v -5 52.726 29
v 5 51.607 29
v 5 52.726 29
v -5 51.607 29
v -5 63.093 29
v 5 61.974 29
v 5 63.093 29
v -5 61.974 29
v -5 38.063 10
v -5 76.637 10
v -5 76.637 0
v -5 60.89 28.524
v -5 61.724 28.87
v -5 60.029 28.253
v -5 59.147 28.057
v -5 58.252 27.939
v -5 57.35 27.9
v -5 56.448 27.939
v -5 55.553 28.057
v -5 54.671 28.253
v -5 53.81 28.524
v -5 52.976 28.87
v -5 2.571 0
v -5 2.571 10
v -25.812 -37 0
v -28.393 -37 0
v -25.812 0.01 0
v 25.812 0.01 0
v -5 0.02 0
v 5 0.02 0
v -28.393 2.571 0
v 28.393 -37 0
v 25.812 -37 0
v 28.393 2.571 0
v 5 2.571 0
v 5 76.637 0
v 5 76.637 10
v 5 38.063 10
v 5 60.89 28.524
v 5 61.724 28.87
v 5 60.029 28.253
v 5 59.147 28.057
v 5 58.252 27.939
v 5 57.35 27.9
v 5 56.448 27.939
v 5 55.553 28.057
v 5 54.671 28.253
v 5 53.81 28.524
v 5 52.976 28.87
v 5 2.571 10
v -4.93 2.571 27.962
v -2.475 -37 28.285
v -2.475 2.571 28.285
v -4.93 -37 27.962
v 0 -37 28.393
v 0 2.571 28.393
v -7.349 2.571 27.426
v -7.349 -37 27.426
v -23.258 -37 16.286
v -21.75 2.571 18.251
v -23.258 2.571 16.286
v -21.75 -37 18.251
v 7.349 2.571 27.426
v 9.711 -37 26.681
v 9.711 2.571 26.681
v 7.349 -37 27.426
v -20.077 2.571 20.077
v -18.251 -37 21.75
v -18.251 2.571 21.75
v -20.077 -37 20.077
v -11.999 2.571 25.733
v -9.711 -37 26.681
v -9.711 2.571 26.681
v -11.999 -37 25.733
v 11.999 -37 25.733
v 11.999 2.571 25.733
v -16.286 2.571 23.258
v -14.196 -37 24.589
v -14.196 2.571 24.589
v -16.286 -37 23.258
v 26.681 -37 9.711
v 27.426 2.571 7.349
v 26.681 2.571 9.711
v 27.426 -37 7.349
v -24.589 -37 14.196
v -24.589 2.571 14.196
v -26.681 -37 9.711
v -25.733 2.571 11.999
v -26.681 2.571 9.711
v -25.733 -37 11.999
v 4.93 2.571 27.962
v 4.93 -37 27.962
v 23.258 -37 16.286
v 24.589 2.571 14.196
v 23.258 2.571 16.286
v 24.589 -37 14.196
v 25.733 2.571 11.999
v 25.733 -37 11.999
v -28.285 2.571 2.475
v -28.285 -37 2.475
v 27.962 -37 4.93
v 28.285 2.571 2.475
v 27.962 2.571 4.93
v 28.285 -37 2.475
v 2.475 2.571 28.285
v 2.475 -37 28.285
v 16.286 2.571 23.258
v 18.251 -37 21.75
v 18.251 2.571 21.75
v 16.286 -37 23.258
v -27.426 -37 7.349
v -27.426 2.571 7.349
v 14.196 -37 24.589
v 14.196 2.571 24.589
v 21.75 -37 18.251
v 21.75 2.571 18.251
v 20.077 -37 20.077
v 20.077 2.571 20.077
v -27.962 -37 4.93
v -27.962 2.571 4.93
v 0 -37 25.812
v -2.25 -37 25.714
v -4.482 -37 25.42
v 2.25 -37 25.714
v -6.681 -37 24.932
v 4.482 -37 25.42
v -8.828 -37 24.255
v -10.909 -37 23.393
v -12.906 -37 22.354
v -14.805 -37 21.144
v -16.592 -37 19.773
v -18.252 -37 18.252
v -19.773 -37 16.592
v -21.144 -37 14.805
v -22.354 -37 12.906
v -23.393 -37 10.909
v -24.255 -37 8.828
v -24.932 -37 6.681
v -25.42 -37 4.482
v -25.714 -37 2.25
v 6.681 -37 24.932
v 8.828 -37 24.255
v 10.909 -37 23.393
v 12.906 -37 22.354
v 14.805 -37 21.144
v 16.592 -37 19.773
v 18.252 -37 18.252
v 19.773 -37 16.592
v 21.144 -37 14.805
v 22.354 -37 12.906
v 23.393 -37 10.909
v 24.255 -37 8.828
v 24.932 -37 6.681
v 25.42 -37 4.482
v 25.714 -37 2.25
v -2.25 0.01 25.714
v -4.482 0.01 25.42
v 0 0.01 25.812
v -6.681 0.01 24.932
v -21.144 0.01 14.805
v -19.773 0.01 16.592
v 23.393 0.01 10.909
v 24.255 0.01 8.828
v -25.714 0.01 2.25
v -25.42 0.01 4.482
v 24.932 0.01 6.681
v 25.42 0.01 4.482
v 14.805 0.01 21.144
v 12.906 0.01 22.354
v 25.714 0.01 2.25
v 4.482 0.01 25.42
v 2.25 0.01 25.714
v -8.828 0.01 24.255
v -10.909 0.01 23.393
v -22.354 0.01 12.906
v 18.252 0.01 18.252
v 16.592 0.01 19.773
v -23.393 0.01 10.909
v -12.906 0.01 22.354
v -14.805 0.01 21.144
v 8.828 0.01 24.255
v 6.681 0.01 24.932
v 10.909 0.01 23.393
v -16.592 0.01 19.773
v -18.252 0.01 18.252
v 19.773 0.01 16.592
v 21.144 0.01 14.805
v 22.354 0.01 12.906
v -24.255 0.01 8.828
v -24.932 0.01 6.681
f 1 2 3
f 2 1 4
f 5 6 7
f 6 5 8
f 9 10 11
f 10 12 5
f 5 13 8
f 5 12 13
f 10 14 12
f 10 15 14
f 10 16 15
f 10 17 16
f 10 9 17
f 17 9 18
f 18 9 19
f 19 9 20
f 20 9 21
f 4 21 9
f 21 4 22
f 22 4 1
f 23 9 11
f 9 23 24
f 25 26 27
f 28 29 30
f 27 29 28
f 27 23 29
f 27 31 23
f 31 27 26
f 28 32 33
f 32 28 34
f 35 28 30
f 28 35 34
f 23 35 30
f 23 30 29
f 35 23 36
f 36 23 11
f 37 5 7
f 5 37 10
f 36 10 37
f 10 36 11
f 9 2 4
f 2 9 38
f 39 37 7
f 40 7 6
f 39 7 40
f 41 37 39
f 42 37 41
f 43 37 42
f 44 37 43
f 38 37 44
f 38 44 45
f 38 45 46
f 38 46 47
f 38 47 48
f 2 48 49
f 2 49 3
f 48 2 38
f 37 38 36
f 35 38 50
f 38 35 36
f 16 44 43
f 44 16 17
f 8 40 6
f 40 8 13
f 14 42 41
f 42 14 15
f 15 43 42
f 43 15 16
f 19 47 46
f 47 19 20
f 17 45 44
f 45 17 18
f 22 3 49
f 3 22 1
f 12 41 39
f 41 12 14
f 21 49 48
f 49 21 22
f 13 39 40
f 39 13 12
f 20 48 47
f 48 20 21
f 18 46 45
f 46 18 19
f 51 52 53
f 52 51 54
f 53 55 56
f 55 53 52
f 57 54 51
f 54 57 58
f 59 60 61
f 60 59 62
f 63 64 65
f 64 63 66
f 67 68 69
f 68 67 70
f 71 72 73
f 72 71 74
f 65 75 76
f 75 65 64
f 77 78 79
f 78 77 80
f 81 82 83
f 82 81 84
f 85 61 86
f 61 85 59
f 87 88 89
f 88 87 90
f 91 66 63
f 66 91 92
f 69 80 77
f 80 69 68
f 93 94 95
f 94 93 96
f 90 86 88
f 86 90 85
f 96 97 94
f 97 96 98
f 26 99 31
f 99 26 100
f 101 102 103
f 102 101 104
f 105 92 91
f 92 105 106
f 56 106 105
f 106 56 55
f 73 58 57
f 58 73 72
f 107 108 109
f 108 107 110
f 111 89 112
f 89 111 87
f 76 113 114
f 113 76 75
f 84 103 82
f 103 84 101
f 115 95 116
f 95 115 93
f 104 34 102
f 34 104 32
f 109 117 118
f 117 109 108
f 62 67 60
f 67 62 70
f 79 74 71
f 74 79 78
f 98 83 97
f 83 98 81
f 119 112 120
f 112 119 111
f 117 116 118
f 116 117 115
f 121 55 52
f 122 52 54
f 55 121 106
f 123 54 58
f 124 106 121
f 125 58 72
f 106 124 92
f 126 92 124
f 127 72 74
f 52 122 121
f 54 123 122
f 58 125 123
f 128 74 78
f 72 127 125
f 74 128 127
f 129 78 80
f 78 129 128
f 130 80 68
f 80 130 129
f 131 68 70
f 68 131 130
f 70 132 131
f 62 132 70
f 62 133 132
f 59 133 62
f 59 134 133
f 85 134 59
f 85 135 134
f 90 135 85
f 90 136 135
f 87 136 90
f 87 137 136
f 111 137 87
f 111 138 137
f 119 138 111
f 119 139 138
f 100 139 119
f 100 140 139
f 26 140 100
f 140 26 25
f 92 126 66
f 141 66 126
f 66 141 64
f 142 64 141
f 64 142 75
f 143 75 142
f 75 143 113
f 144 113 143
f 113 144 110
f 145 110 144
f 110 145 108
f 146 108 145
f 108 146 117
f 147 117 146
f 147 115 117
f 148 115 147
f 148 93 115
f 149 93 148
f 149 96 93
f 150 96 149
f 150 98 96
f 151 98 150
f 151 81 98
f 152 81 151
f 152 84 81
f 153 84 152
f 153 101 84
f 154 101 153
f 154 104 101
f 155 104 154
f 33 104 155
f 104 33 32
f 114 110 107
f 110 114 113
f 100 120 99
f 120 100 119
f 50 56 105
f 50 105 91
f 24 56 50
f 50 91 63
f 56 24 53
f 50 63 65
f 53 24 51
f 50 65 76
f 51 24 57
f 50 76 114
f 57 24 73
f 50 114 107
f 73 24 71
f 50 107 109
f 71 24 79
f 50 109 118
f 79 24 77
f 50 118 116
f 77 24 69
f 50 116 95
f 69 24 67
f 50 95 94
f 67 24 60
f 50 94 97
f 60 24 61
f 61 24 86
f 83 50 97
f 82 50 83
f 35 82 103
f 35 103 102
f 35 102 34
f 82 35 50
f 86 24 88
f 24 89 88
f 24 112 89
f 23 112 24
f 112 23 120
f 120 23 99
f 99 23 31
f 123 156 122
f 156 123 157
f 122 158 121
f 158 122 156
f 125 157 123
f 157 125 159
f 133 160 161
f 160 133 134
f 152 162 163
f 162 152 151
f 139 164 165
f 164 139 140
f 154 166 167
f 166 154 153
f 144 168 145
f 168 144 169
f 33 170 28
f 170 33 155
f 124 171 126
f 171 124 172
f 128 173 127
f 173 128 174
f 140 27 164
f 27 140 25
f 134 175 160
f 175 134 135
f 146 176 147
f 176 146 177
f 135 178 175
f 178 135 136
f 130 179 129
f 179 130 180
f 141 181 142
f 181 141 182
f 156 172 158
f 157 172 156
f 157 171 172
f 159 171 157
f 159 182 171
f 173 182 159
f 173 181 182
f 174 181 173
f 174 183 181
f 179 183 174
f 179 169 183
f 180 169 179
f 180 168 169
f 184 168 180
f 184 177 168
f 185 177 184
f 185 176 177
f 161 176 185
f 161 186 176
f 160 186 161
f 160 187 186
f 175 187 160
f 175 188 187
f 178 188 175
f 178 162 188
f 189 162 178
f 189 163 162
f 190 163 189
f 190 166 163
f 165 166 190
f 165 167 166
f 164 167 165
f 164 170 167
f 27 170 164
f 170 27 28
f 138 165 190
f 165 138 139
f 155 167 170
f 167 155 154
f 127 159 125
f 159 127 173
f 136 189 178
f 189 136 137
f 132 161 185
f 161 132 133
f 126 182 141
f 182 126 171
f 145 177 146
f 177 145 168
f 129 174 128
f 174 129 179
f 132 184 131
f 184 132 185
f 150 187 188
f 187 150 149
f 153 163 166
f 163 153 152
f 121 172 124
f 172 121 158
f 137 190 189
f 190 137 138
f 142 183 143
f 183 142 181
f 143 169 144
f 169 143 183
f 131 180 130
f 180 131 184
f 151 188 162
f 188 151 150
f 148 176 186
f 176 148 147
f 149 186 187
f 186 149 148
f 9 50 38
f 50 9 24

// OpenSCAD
// All measurements are in mm

// You will need to change the following to fit your oven. If you're not sure
// what a particular setting does, try changing it and observing how the model
// changes.
//
dial_diameter = 37;
dial_thickness = 18;
handle_diameter = 20.7;
handle_distance_from_front = 27.9; // needs to be absolutely precise
handle_distance_from_dial = 47;

// Higher values here makes it harder to insert and remove the oven shield. You
// want it to be impossible for the child to remove it but possible for you to
// insert it.
handle_embedding_depth = 1.1;
handle_embedding_sides = 1.1;

rod_diameter = 10;

$fs=.1; // decrease for finer details
$fa=5; // decrease for finer details

// As a final configuration step, you may tweak the translation and rotation
// of the model here.
translate([0,0,0]) rotate([0,0,90]) oven_shield();

////// END OF CONFIGURATION //////


dial_rad = sqrt(pow(dial_diameter/2, 2) + pow(dial_thickness,2));
dial_len = dial_diameter;

handle_rad = handle_diameter / 2;
handle_hole_height = handle_distance_from_front + handle_diameter/2;

// rad^2 = (rad - emb)^2 + (x/2)^2, solved for x
handle_emb_length =
	2*sqrt( pow(handle_rad,2) - pow(handle_rad - handle_embedding_depth, 2));

wall_thickness = dial_rad * 0.1;
big_rad = dial_rad + wall_thickness;
eps = 0.01;

module oven_shield() {
	// central rod
	translate([2*eps,-rod_diameter/2,0])
		cube([handle_distance_from_dial + handle_rad,
		      rod_diameter,
		      rod_diameter]);
	
	// handle grip
	translate([handle_distance_from_dial + handle_rad,-rod_diameter/2,0]) {
		difference() {
			hull() {
				translate([-rod_diameter-handle_emb_length,0,0])
					cube([2*(rod_diameter+handle_emb_length),
					      rod_diameter, rod_diameter]);
				translate([-handle_emb_length/2 - handle_embedding_sides,0])
					cube([handle_emb_length + 2*handle_embedding_sides,
					      rod_diameter,
					      handle_distance_from_front + handle_embedding_depth]);
			}
			translate([0,rod_diameter/2,handle_hole_height])
				rotate([90,0,0])
				cylinder(h=rod_diameter+2*eps, r=handle_rad, center=true);
		}
	}
	
	// dial shield
	rotate([0,-90,0])
		difference() {
			union() {
				cylinder(r=big_rad, h=dial_len);
				translate([0,0,-wall_thickness+eps])
					cylinder(r=big_rad, h=wall_thickness);
			}
			translate([0,0,-eps]) cylinder(r=dial_rad, h=dial_len+2*eps);
			translate([-(big_rad+eps), -(big_rad+eps), -eps-wall_thickness])
				cube([big_rad+eps, 2*(big_rad+eps),
				      dial_len+2*eps + wall_thickness]);
		}
}
